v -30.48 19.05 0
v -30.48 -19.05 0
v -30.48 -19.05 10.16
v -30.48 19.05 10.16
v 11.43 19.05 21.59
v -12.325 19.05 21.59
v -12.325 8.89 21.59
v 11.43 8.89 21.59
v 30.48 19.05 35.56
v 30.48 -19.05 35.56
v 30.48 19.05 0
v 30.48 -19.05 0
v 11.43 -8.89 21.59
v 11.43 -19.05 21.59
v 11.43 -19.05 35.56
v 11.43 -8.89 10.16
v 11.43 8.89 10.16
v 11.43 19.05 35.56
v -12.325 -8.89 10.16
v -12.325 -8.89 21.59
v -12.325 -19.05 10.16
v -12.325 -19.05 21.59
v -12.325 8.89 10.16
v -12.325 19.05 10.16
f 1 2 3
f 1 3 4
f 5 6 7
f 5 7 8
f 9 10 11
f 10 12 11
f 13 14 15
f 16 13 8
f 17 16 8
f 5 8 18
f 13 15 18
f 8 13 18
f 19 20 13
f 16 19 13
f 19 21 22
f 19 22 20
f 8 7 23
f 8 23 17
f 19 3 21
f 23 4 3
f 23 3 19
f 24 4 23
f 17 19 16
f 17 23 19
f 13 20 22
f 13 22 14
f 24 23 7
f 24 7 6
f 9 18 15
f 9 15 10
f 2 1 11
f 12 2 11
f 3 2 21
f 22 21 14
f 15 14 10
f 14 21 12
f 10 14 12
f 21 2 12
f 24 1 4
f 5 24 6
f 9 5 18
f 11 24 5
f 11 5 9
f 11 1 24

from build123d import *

# Parameters (mm, degrees)
F0_W     = 60.96
F0_H     = 38.1
F1_DEPTH = 10.16
F2_W     = 19.05
F2_H     = 38.1
F3_DEPTH = 25.4
F4_W     = 23.755038
F4_H     = 38.1
F5_DEPTH = 11.43
F6_W     = 23.755038
F6_H     = 17.78
F7_DEPTH = 11.43


with BuildPart() as f1:
    # F0 (on Top) → F1 (new body)
    with BuildSketch(Plane.XY):
        Rectangle(F0_W, F0_H)
    extrude(amount=F1_DEPTH)

    # F2 (on face) → F3 (join)
    with BuildSketch(Plane.XY.offset(10.16)):
        with Locations((20.955, 0)):
            Rectangle(F2_W, F2_H)
    extrude(amount=F3_DEPTH)

    # F4 (on face) → F5 (join)
    with BuildSketch(Plane.XY.offset(10.16)):
        with Locations((-0.447519, 0)):
            Rectangle(F4_W, F4_H)
    extrude(amount=F5_DEPTH)

    # F6 (on face) → F7 (cut, through all)
    with BuildSketch(Plane.XY.offset(21.59)):
        with Locations((-0.447519, 0)):
            Rectangle(F6_W, F6_H)
    extrude(amount=-F7_DEPTH, mode=Mode.SUBTRACT)


solid = f1.part
